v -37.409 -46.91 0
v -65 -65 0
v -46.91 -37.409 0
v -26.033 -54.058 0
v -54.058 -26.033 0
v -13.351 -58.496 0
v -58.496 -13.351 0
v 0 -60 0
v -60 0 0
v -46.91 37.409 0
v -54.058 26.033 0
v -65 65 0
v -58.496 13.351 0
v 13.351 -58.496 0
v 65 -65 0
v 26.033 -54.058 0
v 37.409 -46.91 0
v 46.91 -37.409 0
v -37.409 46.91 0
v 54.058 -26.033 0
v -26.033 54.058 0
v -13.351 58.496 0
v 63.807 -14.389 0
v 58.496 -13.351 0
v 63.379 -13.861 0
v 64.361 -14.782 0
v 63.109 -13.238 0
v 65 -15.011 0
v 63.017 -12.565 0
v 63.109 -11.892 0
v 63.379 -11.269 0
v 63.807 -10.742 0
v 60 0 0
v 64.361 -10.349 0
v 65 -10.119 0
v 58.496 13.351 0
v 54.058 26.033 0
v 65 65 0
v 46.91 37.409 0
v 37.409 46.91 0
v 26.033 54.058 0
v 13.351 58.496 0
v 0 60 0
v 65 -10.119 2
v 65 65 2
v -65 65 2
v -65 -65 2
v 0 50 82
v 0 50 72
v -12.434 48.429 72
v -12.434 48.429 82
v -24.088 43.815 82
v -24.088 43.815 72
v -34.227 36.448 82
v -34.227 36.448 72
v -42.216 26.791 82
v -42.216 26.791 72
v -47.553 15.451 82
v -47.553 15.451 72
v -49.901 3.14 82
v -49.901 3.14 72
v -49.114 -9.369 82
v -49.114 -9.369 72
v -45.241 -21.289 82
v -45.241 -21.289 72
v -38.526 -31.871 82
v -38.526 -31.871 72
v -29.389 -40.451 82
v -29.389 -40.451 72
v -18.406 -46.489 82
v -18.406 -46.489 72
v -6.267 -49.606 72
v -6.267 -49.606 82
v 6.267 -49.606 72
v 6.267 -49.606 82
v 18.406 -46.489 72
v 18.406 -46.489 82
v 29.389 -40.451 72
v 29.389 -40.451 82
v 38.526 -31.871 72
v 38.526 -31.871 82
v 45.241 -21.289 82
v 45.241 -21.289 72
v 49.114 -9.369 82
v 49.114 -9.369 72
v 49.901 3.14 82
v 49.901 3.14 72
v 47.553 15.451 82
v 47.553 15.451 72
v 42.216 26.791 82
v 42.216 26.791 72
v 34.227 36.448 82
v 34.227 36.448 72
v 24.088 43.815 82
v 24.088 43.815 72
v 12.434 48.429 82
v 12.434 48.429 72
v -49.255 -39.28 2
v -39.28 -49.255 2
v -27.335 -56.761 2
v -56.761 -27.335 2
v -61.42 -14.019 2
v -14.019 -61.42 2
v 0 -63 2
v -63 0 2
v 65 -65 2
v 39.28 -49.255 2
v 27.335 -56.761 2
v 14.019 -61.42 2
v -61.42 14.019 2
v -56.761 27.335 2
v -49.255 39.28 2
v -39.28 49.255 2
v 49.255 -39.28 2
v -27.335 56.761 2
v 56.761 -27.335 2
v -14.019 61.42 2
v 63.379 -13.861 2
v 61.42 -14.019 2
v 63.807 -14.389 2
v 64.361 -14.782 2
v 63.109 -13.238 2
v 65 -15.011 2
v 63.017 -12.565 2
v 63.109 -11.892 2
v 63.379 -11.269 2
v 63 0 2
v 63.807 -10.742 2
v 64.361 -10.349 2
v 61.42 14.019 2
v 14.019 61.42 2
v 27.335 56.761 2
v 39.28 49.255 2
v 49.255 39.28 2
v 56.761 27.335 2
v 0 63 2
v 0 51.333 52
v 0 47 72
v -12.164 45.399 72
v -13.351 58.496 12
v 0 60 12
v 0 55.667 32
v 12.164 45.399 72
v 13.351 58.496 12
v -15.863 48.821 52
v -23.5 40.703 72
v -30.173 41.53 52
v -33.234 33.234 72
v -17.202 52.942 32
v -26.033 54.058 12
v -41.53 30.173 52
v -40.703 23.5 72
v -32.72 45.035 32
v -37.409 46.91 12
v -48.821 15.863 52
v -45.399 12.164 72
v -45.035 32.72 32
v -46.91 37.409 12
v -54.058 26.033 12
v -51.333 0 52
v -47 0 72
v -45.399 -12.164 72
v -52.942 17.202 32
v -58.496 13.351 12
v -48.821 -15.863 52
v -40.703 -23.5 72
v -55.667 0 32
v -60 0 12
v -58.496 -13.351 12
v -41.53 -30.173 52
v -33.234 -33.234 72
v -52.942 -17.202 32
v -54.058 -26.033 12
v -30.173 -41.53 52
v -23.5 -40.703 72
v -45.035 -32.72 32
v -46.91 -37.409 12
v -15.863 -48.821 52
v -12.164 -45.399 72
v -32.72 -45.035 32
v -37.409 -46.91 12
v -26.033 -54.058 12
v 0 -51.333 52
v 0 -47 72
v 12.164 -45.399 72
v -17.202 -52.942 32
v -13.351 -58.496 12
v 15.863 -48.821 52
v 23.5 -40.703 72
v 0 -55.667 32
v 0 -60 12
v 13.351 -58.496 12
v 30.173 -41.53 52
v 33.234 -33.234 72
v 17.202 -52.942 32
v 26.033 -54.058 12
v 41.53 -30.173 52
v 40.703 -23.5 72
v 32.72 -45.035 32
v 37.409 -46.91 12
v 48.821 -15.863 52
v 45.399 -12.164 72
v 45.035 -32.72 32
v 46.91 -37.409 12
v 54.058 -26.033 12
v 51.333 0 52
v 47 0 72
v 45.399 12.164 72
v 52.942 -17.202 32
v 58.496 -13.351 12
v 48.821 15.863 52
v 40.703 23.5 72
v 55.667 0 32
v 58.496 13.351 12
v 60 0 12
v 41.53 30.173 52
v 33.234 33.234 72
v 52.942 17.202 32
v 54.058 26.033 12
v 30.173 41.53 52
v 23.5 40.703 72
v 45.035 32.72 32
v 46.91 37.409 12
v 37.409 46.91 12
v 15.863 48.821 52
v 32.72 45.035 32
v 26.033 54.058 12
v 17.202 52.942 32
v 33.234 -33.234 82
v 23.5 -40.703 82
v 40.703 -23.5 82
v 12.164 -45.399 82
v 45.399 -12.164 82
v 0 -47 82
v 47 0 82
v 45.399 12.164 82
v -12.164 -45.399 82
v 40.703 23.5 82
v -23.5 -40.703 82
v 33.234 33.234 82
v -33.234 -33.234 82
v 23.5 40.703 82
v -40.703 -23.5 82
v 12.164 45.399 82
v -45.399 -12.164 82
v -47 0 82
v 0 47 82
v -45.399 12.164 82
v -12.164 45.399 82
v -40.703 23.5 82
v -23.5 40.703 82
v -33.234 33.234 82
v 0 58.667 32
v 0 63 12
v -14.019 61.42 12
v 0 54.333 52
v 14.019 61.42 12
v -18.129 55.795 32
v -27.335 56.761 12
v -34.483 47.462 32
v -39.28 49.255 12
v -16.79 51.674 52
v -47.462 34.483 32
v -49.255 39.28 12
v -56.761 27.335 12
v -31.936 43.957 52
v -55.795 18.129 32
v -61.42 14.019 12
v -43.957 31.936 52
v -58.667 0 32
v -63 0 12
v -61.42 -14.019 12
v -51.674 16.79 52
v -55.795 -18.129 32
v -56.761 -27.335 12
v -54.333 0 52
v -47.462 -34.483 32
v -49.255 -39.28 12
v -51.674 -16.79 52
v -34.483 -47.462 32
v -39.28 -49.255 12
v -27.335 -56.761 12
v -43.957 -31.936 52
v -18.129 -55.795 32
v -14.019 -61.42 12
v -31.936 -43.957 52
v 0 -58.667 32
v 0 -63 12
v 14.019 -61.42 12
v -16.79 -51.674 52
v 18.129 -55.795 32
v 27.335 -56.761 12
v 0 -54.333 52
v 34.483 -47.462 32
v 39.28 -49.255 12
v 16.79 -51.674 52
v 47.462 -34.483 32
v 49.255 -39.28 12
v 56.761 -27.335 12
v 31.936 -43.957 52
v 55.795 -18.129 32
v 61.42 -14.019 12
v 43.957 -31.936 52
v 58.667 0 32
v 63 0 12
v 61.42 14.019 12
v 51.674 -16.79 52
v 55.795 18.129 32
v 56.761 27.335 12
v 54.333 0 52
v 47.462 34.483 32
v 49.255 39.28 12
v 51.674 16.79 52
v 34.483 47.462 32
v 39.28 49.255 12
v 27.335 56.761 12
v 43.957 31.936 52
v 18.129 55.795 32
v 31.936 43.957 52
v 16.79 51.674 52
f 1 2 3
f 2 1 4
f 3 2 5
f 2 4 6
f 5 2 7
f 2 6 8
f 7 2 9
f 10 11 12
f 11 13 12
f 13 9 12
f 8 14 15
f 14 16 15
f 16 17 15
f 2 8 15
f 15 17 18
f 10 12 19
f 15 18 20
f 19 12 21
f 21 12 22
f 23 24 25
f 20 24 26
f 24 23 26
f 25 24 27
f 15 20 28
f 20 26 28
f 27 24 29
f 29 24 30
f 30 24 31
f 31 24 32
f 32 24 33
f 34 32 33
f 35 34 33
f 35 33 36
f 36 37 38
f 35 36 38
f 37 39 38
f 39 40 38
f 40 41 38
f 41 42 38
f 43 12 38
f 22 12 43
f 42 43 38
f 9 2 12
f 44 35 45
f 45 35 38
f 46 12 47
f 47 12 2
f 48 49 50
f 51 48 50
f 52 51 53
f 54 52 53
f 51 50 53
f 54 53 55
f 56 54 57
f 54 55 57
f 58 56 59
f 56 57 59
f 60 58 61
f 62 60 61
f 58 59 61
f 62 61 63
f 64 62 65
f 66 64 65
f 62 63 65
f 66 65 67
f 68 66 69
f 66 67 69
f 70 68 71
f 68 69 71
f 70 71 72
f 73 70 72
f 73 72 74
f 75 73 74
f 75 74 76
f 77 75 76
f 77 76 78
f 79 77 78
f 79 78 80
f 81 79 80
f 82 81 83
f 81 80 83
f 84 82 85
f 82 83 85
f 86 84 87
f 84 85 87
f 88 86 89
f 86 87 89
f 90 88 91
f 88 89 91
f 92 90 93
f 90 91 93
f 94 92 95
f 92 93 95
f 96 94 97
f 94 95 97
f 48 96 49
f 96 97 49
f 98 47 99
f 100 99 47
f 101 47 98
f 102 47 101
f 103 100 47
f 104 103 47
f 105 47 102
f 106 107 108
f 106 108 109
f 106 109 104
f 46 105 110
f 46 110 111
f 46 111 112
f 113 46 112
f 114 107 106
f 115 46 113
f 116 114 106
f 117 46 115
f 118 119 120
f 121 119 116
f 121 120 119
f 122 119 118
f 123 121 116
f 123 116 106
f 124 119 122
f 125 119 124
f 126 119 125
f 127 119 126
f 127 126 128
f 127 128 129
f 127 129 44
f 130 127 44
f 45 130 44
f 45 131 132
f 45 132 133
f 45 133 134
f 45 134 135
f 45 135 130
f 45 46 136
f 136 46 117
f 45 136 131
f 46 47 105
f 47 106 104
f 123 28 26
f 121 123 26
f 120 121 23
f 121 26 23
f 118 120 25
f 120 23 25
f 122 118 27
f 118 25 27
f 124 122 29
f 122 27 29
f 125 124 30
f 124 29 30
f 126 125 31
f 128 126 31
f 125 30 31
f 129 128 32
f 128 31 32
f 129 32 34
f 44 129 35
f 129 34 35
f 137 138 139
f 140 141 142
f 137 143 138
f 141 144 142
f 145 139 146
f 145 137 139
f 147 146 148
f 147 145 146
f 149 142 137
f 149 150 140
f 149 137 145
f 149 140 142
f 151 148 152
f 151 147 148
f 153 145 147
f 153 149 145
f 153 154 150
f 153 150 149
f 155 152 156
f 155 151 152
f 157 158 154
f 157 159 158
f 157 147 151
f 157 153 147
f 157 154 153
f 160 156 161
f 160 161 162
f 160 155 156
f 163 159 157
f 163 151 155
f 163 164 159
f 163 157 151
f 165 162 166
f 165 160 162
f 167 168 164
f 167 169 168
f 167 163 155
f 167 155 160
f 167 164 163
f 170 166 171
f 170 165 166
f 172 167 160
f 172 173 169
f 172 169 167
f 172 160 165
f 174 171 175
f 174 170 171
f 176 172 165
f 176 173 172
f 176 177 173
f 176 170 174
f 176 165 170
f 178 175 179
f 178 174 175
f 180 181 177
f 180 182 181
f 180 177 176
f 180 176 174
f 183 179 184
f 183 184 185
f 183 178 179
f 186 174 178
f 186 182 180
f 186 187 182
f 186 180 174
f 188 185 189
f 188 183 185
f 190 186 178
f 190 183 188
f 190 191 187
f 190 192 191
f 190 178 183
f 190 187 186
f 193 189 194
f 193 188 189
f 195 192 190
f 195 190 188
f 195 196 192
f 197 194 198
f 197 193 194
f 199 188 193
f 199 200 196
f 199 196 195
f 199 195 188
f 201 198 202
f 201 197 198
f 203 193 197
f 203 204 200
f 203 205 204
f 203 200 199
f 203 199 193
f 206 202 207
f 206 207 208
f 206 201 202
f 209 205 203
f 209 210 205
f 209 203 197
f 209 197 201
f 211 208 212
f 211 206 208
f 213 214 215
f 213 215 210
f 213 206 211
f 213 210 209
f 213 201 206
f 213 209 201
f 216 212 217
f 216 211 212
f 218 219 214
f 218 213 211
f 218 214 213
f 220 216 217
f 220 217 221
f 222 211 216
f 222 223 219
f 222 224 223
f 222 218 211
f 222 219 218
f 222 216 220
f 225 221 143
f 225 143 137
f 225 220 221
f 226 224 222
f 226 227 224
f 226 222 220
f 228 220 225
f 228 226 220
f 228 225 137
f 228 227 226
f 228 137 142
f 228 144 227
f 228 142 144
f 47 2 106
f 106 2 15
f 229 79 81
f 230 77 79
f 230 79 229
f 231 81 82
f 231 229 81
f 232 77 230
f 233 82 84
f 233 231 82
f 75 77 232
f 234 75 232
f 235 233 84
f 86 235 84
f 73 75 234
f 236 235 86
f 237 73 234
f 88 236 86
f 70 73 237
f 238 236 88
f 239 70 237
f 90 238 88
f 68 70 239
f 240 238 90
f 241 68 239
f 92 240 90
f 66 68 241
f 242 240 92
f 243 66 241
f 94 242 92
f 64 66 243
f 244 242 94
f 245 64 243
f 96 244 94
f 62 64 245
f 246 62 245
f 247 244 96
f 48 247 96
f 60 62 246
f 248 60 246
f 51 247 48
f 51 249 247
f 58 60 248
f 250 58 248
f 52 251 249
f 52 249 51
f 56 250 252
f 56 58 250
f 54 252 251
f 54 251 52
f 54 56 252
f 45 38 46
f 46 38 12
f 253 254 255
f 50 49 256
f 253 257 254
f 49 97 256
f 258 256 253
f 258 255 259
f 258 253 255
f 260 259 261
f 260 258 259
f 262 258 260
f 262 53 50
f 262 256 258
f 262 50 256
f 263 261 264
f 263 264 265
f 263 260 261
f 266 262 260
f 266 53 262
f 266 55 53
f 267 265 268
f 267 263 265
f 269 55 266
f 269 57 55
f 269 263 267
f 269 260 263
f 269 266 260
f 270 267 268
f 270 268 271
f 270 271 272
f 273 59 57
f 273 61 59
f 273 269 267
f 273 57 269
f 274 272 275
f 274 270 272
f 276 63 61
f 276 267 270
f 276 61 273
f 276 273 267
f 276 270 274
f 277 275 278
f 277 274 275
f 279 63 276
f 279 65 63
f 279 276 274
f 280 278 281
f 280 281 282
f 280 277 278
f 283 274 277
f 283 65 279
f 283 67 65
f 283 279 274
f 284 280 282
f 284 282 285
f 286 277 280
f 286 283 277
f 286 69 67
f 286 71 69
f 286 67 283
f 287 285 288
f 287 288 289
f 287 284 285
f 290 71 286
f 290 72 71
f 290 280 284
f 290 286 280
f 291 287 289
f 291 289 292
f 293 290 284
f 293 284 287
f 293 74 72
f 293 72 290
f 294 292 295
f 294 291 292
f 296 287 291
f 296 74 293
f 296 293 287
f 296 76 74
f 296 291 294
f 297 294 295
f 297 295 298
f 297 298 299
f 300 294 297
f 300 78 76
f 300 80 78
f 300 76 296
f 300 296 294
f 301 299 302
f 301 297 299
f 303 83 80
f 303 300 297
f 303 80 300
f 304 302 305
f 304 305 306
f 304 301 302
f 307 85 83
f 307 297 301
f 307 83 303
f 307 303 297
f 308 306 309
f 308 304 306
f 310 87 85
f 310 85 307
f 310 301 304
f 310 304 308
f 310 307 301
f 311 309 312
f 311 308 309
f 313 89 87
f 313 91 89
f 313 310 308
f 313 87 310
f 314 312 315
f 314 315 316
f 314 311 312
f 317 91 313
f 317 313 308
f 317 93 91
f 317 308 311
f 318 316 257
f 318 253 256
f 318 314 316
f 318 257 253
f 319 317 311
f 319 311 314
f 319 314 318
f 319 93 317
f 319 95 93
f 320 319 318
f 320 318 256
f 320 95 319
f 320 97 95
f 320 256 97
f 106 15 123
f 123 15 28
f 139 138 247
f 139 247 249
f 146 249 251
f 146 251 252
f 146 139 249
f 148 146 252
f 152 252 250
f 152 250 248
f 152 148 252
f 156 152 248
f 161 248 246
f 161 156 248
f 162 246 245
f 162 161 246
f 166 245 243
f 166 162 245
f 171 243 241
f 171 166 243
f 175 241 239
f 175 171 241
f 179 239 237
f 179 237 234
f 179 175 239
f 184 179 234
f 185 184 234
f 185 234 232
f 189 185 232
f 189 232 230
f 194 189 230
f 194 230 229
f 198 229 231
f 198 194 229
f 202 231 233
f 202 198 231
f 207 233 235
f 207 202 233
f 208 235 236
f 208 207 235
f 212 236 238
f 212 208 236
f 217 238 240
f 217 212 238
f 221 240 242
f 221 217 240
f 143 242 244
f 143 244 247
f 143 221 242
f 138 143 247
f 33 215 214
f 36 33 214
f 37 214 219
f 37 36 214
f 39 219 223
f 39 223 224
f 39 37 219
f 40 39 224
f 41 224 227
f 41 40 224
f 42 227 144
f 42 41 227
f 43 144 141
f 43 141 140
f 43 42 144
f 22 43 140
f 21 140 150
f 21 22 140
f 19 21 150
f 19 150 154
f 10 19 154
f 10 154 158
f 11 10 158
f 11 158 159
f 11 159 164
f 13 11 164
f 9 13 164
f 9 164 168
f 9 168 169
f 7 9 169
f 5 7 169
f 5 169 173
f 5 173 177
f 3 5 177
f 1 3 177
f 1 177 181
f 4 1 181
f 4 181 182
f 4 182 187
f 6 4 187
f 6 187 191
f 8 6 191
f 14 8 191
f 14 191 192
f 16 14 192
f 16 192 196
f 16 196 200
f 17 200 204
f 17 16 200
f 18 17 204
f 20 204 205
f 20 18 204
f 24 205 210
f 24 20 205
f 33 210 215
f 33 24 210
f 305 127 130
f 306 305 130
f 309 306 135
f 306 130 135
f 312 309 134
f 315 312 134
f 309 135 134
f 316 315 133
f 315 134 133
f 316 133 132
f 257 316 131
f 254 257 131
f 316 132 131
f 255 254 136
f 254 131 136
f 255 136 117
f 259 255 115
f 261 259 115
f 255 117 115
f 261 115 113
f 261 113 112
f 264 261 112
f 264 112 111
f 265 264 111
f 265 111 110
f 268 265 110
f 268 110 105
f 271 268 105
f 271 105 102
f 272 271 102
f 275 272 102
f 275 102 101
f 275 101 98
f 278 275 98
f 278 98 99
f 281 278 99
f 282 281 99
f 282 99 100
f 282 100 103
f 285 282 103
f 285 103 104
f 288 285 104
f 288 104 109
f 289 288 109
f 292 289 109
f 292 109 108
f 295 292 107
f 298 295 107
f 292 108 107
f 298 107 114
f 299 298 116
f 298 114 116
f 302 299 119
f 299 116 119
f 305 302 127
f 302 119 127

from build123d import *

# Parameters (mm, degrees)
F0_R     = 63
F0_R_2   = 60
F1_DEPTH = 2
F2_DEPTH = 12
F5_DEPTH = 10


with BuildPart() as f1:
    # F0 (on Top) → F1 (new body)
    with BuildSketch(Plane.XY):
        with BuildLine():
            Line((65, 65), (-65, 65))
            Line((-65, 65), (-65, -65))
            Line((-65, -65), (65, -65))
            Line((65, -65), (65, -15.0111682118))
            ThreePointArc((65, -15.0111682118), (63.0170909154, -12.5652293358), (65, -10.1192904598))
            Line((65, -10.1192904598), (65, 65))
        make_face()
        Circle(F0_R, mode=Mode.SUBTRACT)
        Circle(F0_R)
        Circle(F0_R_2, mode=Mode.SUBTRACT)
    extrude(amount=F1_DEPTH)

    # F0 (on Top) → F2 (join)
    with BuildSketch(Plane.XY):
        Circle(F0_R)
        Circle(F0_R_2, mode=Mode.SUBTRACT)
    extrude(amount=F2_DEPTH)

    # F3 (on Right) → F4 (revolve)
    with BuildSketch(Plane.YZ):
        Polygon((47, 72), (60, 12), (63, 12), (50, 72), align=None)
    revolve(axis=Axis((0, 0, 42), (0, 0, 1)))

    # F5 (add): a face of the model
    f5_faces = [f1.faces().sort_by_distance(p)[0] for p in [
        (0, -48.5857864376, 72),
    ]]
    extrude(f5_faces, amount=F5_DEPTH)


solid = f1.part
